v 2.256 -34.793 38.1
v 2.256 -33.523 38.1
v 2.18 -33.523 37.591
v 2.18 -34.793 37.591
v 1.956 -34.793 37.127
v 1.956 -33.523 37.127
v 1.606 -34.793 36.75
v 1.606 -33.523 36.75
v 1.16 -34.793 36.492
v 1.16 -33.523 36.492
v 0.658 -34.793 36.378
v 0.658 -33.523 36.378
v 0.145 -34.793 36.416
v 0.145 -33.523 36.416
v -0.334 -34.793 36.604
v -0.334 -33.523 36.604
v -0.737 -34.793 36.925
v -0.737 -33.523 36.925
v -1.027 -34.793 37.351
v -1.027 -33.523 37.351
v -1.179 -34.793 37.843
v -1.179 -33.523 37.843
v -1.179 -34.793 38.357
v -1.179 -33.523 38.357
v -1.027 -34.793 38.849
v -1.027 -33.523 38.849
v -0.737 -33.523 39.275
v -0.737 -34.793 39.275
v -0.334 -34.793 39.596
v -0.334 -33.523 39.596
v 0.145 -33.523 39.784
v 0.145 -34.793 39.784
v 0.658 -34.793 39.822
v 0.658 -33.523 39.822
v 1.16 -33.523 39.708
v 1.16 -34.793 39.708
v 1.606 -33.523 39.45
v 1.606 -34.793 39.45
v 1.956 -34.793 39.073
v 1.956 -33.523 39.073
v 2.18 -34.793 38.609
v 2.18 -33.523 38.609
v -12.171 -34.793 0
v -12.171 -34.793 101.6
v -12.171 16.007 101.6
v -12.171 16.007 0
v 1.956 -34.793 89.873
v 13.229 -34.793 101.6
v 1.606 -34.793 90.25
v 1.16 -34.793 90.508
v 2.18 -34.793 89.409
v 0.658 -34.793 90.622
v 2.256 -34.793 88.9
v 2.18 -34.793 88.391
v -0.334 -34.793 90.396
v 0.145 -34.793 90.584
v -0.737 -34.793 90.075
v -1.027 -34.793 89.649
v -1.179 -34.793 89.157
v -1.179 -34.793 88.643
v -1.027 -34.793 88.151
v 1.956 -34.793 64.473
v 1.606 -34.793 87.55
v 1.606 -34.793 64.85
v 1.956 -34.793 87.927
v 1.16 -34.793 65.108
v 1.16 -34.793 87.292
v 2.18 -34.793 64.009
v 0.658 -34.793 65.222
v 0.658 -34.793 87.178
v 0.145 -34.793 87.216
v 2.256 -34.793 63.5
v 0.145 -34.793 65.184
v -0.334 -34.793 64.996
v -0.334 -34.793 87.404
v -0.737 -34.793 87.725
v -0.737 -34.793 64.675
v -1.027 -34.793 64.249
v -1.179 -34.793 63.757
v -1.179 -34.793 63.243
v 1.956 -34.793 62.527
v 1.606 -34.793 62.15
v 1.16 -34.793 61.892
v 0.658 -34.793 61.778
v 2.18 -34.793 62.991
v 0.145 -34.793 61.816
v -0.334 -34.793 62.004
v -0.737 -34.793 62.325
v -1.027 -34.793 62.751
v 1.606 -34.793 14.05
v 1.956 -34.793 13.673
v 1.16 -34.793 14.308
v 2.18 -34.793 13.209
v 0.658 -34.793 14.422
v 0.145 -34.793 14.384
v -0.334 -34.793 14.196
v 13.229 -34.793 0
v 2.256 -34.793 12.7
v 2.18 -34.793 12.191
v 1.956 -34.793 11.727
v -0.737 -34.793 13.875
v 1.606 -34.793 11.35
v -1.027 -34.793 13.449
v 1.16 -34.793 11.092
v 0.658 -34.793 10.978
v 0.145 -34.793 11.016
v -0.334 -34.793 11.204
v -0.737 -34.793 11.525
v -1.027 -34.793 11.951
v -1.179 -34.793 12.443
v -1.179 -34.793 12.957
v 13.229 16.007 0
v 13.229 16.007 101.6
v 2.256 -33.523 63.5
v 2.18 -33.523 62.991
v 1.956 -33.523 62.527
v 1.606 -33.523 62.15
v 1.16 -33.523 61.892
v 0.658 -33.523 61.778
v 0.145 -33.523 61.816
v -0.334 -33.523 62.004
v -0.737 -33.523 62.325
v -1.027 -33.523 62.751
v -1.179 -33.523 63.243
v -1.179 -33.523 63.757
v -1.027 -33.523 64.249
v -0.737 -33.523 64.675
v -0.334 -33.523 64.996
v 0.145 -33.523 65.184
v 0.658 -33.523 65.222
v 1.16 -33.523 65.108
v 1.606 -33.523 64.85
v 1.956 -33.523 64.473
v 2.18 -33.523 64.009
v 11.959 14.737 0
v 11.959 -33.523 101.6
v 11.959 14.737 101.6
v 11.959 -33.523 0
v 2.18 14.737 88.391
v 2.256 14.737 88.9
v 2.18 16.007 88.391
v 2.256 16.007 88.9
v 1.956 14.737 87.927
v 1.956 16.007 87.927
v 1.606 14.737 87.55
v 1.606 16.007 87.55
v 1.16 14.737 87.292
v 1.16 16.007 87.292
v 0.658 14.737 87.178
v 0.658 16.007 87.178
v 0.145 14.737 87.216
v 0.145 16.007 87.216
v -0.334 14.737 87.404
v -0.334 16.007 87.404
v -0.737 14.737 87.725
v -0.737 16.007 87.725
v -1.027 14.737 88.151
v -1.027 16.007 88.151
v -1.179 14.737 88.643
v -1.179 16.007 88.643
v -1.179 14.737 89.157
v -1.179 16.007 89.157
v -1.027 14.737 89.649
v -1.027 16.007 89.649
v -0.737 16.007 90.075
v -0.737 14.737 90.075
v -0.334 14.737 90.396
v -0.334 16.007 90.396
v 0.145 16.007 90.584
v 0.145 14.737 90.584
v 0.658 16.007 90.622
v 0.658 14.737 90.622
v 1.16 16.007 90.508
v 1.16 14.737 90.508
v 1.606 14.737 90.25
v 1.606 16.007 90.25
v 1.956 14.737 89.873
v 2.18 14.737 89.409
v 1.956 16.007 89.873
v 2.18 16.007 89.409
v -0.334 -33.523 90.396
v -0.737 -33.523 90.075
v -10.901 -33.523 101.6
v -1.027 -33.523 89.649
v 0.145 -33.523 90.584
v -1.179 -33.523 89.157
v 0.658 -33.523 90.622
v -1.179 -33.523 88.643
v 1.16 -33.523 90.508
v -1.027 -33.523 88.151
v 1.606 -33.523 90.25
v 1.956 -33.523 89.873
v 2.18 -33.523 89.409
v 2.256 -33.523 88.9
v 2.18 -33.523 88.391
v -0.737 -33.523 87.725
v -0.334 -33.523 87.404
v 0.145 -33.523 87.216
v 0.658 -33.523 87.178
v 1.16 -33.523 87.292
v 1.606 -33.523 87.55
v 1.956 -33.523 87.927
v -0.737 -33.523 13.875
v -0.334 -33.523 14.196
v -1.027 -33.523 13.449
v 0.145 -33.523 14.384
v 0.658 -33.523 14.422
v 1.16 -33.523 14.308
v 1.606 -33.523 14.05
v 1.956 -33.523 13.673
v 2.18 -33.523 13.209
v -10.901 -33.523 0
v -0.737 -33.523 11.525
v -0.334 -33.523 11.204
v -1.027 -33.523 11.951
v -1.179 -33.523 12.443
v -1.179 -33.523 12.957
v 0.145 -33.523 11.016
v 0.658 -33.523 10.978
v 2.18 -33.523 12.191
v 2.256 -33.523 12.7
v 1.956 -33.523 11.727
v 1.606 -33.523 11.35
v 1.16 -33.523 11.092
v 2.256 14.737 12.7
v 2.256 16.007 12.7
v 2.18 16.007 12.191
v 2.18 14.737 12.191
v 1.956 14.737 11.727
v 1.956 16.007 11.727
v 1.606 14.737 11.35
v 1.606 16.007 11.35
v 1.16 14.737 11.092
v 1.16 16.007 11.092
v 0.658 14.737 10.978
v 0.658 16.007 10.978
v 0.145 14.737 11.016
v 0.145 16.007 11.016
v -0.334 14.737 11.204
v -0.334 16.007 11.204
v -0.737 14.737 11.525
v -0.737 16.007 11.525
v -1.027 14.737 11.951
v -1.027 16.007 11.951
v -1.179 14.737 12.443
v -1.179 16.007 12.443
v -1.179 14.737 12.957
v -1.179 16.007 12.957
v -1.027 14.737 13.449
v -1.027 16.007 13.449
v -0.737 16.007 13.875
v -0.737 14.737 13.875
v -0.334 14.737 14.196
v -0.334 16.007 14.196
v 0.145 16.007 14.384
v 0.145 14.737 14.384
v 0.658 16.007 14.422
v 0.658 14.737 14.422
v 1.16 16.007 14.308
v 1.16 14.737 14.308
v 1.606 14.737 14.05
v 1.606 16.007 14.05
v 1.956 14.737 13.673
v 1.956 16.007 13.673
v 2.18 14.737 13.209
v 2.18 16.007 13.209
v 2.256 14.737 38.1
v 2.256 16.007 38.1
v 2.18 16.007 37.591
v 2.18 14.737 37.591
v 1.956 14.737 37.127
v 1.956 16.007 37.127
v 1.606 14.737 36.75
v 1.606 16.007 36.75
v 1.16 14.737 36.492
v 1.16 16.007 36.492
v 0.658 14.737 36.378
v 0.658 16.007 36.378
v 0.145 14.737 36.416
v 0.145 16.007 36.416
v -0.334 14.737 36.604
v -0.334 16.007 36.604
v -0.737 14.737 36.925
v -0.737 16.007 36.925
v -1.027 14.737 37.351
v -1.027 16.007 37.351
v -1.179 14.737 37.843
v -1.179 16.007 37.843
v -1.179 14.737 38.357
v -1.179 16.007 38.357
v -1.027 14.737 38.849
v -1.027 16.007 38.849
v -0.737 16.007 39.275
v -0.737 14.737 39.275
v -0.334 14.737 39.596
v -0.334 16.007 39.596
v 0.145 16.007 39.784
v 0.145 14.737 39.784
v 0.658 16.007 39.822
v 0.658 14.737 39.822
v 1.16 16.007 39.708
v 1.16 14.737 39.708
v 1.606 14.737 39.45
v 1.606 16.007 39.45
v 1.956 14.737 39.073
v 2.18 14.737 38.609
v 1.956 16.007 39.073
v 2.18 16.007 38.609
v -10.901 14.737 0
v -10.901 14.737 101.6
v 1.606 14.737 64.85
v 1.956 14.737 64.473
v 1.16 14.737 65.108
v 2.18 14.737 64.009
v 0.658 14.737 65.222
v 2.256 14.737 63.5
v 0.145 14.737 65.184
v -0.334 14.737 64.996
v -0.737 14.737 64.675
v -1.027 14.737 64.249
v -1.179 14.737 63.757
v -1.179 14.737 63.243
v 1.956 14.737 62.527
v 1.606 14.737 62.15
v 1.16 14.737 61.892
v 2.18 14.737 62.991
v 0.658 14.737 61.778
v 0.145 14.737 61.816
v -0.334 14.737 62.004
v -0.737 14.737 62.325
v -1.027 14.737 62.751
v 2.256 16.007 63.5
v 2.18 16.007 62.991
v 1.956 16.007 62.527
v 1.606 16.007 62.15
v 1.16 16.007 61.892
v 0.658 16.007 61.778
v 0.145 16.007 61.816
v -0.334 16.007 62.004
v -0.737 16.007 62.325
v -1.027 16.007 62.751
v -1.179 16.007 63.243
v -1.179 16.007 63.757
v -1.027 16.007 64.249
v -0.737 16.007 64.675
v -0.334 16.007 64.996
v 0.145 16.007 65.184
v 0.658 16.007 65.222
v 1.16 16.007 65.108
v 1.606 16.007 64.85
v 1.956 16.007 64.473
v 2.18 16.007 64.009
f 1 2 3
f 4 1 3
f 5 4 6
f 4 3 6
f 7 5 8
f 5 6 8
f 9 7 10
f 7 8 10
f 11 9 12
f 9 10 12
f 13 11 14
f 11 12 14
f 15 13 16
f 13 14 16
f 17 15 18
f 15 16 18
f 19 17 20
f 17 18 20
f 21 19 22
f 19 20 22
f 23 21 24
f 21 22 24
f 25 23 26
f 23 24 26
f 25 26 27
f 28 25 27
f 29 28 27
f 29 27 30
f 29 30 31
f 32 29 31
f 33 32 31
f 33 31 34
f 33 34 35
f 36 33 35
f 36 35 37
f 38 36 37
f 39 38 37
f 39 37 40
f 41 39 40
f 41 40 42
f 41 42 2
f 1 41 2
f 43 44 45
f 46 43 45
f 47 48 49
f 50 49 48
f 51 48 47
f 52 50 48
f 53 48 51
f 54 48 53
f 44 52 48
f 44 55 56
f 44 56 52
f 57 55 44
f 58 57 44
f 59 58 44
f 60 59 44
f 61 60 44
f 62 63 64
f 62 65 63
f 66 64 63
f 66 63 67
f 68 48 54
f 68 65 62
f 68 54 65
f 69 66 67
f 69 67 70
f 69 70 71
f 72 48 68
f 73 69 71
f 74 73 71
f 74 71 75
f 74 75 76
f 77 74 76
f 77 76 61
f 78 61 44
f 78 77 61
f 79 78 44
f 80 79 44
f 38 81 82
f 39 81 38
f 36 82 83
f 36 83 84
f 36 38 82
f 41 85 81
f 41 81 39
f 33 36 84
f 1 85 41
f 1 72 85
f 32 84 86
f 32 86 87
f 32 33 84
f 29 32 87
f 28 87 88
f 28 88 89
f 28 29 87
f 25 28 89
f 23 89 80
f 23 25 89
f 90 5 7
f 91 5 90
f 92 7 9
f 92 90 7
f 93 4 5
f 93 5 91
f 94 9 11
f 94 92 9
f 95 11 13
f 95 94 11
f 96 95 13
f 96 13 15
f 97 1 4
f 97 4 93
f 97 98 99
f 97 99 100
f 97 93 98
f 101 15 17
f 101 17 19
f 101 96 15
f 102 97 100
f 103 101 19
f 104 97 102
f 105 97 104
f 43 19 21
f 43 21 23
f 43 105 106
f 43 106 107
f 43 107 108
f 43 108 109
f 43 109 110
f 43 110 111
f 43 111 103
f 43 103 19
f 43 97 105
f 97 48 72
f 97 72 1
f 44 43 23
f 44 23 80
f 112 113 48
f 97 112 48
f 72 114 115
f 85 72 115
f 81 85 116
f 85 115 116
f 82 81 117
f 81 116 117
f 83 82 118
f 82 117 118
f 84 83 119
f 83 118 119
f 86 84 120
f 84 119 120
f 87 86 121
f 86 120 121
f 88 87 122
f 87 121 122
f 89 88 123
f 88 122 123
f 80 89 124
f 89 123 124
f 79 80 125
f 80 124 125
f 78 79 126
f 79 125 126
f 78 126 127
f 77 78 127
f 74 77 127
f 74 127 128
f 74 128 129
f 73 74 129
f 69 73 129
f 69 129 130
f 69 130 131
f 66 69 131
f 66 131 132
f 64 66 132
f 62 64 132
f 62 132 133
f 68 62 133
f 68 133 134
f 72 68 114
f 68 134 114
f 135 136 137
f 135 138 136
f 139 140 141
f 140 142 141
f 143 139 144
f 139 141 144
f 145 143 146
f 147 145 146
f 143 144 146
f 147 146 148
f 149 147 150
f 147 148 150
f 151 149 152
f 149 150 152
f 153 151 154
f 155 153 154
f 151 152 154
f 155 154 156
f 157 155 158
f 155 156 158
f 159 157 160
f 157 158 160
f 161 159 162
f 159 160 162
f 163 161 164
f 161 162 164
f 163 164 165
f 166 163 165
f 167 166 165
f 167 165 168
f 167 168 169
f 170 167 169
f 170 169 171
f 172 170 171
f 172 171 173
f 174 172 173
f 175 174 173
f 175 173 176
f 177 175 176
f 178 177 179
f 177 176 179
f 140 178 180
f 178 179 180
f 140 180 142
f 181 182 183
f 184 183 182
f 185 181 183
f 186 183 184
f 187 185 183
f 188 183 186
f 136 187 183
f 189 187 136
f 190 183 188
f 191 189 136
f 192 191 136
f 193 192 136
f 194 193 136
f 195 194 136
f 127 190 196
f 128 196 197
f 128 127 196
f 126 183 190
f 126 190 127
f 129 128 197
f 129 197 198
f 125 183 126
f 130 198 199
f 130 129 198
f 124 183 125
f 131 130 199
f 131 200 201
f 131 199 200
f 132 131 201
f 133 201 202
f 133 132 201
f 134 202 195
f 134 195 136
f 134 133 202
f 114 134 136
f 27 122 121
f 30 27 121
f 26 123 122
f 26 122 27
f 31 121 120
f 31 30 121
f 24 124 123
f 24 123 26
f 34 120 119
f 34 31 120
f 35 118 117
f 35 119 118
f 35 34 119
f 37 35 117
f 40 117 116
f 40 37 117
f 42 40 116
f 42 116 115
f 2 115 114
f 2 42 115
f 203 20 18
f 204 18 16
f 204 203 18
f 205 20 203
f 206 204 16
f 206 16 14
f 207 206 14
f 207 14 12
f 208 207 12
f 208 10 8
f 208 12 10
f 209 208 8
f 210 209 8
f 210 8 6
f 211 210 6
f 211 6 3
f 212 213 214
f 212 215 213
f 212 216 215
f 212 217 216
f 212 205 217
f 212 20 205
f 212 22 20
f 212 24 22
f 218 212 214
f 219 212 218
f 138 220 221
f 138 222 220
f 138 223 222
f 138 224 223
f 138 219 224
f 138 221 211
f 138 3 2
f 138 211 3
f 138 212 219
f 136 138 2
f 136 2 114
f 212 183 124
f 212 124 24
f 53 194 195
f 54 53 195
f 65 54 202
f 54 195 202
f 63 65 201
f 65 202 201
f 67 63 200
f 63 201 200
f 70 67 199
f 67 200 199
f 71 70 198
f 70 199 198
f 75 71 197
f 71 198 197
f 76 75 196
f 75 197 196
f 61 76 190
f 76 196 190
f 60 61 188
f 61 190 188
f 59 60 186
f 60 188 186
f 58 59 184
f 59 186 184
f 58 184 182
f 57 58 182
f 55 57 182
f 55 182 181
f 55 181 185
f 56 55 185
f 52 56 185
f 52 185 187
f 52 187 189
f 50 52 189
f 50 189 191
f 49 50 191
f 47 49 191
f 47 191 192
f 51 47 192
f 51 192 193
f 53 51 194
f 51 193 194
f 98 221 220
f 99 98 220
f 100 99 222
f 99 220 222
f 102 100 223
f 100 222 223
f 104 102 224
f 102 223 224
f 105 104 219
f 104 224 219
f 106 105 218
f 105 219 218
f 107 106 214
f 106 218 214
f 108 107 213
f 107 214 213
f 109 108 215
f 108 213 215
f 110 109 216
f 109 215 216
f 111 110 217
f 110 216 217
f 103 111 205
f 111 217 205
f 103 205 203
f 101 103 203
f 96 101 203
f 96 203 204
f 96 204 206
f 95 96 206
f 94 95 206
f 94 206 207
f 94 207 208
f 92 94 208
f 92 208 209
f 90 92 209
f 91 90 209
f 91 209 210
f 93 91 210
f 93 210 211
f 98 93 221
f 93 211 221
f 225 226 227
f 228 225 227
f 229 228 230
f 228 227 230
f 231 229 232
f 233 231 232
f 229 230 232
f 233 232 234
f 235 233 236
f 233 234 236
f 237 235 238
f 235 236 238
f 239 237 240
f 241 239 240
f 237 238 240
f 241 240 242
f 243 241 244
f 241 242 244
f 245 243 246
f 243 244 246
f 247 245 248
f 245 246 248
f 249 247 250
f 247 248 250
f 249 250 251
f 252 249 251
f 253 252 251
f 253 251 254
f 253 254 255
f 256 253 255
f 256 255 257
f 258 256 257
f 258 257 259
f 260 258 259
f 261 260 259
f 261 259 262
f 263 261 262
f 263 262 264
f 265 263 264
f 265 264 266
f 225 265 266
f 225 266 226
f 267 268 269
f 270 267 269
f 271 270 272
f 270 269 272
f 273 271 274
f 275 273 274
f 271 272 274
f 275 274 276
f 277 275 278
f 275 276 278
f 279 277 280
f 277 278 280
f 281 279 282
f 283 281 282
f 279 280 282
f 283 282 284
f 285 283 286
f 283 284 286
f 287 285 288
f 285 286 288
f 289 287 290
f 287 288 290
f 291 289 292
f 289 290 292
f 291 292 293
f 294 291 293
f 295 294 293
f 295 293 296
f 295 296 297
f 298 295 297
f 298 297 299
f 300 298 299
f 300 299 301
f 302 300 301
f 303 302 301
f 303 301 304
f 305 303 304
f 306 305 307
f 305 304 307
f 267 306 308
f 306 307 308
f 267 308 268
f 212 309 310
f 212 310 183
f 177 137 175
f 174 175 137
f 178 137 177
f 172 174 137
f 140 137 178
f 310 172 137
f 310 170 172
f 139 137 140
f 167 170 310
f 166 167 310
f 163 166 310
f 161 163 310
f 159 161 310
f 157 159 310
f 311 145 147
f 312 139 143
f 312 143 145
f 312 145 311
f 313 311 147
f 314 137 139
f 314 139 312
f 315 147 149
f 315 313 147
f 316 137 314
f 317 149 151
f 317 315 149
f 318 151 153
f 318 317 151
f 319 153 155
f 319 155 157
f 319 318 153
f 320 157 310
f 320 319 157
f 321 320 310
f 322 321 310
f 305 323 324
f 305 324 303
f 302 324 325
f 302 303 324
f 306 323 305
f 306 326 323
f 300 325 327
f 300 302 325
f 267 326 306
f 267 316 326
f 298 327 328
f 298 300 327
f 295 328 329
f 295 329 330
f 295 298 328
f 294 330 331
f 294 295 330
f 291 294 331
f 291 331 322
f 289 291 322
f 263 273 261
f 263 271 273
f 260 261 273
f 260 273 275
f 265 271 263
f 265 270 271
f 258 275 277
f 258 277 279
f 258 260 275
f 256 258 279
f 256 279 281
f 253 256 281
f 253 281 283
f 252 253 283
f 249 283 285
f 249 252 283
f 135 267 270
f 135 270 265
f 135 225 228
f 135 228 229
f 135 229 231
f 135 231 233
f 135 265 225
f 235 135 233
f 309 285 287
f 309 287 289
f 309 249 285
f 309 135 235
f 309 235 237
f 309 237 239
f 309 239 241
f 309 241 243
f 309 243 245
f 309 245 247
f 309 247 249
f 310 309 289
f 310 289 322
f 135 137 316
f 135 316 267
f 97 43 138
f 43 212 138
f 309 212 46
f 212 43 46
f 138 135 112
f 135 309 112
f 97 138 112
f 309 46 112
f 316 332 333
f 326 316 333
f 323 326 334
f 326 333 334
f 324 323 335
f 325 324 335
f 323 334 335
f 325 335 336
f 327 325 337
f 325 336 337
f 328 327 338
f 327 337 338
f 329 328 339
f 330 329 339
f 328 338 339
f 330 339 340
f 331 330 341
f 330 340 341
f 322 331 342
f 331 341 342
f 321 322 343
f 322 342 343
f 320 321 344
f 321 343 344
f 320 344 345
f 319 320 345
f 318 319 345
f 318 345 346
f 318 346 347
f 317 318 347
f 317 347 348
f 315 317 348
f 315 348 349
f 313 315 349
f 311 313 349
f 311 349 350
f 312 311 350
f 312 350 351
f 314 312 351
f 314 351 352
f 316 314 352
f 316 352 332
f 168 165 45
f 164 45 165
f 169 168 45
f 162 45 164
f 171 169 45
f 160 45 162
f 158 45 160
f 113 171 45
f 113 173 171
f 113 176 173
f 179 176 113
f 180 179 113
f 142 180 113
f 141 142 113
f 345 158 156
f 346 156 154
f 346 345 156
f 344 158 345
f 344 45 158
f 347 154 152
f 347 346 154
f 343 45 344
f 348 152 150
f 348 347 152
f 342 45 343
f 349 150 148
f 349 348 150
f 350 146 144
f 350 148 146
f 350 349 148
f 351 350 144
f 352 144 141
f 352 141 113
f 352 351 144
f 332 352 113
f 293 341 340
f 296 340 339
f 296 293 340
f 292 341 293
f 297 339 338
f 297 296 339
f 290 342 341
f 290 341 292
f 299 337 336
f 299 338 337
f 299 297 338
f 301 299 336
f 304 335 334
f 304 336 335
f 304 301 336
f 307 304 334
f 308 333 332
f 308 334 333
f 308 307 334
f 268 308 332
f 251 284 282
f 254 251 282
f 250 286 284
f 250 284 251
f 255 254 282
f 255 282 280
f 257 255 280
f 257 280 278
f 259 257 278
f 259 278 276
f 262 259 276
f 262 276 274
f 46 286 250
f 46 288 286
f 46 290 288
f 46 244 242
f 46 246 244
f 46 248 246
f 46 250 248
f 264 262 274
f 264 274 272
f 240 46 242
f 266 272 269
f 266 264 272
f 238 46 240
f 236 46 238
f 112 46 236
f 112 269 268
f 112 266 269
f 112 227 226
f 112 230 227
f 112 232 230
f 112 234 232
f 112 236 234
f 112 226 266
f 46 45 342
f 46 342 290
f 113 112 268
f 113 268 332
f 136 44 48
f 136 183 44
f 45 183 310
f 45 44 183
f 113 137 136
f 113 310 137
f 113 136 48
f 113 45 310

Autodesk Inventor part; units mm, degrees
ref_plane "YZ Plane" through (0, 0, 0) normal (1, 0, 0) x (0, 1, 0)
ref_plane "XZ Plane" through (0, 0, 0) normal (0, 1, 0) x (-1, 0, 0)
ref_plane "XY Plane" through (0, 0, 0) normal (0, 0, 1) x (1, 0, 0)
sketch "Sketch1" plane through (0, 0, 0) normal (0, 0, 1) x (1, 0, 0)
  line L0 (-12.1708, 16.0073) -> (13.2292, 16.0073)
  line L1 (13.2292, 16.0073) -> (13.2292, -34.7927)
  line L2 (13.2292, -34.7927) -> (-12.1708, -34.7927)
  line L3 (-12.1708, -34.7927) -> (-12.1708, 16.0073)
  line L4 (11.9592, 14.7373) -> (-10.9008, 14.7373)
  line L5 (-10.9008, 14.7373) -> (-10.9008, -33.5227)
  line L6 (-10.9008, -33.5227) -> (11.9592, -33.5227)
  line L7 (11.9592, -33.5227) -> (11.9592, 14.7373)
  point P0 (0, 0)
  dimension "d0" = 25.4
  dimension "d1" = 50.8
  dimension "d2" = 1.27
extrude "Extrusion1" add sketch "Sketch1" along normal blind 101.6
sketch "Sketch2" plane through (-12.1708, 16.0073, 0) normal (0, 1, 0) x (1, 0, 0)
  circle A0 centre (12.7, -12.7) radius 1.7272
  line L0 (25.4, 0) -> (0, 0) projected
  line L1 (0, 0) -> (0, -101.6) projected
  point P0 (12.1708, 0)
  dimension "d5" = 3.4544
  dimension "d6" = 12.7
  dimension "d7" = 12.7
extrude "Extrusion2" cut sketch "Sketch2" against normal through all
pattern_linear "Rectangular Pattern1" count 10 spacing 25.4 along (0, 0, 1) of "Extrusion2"
equation "\"d3\" = d13"
equation "\"d10\" = d14"
equation "\"d13\" = 101.6"
equation "\"d14\" = d13"
properties part number "wrist attatchment"
